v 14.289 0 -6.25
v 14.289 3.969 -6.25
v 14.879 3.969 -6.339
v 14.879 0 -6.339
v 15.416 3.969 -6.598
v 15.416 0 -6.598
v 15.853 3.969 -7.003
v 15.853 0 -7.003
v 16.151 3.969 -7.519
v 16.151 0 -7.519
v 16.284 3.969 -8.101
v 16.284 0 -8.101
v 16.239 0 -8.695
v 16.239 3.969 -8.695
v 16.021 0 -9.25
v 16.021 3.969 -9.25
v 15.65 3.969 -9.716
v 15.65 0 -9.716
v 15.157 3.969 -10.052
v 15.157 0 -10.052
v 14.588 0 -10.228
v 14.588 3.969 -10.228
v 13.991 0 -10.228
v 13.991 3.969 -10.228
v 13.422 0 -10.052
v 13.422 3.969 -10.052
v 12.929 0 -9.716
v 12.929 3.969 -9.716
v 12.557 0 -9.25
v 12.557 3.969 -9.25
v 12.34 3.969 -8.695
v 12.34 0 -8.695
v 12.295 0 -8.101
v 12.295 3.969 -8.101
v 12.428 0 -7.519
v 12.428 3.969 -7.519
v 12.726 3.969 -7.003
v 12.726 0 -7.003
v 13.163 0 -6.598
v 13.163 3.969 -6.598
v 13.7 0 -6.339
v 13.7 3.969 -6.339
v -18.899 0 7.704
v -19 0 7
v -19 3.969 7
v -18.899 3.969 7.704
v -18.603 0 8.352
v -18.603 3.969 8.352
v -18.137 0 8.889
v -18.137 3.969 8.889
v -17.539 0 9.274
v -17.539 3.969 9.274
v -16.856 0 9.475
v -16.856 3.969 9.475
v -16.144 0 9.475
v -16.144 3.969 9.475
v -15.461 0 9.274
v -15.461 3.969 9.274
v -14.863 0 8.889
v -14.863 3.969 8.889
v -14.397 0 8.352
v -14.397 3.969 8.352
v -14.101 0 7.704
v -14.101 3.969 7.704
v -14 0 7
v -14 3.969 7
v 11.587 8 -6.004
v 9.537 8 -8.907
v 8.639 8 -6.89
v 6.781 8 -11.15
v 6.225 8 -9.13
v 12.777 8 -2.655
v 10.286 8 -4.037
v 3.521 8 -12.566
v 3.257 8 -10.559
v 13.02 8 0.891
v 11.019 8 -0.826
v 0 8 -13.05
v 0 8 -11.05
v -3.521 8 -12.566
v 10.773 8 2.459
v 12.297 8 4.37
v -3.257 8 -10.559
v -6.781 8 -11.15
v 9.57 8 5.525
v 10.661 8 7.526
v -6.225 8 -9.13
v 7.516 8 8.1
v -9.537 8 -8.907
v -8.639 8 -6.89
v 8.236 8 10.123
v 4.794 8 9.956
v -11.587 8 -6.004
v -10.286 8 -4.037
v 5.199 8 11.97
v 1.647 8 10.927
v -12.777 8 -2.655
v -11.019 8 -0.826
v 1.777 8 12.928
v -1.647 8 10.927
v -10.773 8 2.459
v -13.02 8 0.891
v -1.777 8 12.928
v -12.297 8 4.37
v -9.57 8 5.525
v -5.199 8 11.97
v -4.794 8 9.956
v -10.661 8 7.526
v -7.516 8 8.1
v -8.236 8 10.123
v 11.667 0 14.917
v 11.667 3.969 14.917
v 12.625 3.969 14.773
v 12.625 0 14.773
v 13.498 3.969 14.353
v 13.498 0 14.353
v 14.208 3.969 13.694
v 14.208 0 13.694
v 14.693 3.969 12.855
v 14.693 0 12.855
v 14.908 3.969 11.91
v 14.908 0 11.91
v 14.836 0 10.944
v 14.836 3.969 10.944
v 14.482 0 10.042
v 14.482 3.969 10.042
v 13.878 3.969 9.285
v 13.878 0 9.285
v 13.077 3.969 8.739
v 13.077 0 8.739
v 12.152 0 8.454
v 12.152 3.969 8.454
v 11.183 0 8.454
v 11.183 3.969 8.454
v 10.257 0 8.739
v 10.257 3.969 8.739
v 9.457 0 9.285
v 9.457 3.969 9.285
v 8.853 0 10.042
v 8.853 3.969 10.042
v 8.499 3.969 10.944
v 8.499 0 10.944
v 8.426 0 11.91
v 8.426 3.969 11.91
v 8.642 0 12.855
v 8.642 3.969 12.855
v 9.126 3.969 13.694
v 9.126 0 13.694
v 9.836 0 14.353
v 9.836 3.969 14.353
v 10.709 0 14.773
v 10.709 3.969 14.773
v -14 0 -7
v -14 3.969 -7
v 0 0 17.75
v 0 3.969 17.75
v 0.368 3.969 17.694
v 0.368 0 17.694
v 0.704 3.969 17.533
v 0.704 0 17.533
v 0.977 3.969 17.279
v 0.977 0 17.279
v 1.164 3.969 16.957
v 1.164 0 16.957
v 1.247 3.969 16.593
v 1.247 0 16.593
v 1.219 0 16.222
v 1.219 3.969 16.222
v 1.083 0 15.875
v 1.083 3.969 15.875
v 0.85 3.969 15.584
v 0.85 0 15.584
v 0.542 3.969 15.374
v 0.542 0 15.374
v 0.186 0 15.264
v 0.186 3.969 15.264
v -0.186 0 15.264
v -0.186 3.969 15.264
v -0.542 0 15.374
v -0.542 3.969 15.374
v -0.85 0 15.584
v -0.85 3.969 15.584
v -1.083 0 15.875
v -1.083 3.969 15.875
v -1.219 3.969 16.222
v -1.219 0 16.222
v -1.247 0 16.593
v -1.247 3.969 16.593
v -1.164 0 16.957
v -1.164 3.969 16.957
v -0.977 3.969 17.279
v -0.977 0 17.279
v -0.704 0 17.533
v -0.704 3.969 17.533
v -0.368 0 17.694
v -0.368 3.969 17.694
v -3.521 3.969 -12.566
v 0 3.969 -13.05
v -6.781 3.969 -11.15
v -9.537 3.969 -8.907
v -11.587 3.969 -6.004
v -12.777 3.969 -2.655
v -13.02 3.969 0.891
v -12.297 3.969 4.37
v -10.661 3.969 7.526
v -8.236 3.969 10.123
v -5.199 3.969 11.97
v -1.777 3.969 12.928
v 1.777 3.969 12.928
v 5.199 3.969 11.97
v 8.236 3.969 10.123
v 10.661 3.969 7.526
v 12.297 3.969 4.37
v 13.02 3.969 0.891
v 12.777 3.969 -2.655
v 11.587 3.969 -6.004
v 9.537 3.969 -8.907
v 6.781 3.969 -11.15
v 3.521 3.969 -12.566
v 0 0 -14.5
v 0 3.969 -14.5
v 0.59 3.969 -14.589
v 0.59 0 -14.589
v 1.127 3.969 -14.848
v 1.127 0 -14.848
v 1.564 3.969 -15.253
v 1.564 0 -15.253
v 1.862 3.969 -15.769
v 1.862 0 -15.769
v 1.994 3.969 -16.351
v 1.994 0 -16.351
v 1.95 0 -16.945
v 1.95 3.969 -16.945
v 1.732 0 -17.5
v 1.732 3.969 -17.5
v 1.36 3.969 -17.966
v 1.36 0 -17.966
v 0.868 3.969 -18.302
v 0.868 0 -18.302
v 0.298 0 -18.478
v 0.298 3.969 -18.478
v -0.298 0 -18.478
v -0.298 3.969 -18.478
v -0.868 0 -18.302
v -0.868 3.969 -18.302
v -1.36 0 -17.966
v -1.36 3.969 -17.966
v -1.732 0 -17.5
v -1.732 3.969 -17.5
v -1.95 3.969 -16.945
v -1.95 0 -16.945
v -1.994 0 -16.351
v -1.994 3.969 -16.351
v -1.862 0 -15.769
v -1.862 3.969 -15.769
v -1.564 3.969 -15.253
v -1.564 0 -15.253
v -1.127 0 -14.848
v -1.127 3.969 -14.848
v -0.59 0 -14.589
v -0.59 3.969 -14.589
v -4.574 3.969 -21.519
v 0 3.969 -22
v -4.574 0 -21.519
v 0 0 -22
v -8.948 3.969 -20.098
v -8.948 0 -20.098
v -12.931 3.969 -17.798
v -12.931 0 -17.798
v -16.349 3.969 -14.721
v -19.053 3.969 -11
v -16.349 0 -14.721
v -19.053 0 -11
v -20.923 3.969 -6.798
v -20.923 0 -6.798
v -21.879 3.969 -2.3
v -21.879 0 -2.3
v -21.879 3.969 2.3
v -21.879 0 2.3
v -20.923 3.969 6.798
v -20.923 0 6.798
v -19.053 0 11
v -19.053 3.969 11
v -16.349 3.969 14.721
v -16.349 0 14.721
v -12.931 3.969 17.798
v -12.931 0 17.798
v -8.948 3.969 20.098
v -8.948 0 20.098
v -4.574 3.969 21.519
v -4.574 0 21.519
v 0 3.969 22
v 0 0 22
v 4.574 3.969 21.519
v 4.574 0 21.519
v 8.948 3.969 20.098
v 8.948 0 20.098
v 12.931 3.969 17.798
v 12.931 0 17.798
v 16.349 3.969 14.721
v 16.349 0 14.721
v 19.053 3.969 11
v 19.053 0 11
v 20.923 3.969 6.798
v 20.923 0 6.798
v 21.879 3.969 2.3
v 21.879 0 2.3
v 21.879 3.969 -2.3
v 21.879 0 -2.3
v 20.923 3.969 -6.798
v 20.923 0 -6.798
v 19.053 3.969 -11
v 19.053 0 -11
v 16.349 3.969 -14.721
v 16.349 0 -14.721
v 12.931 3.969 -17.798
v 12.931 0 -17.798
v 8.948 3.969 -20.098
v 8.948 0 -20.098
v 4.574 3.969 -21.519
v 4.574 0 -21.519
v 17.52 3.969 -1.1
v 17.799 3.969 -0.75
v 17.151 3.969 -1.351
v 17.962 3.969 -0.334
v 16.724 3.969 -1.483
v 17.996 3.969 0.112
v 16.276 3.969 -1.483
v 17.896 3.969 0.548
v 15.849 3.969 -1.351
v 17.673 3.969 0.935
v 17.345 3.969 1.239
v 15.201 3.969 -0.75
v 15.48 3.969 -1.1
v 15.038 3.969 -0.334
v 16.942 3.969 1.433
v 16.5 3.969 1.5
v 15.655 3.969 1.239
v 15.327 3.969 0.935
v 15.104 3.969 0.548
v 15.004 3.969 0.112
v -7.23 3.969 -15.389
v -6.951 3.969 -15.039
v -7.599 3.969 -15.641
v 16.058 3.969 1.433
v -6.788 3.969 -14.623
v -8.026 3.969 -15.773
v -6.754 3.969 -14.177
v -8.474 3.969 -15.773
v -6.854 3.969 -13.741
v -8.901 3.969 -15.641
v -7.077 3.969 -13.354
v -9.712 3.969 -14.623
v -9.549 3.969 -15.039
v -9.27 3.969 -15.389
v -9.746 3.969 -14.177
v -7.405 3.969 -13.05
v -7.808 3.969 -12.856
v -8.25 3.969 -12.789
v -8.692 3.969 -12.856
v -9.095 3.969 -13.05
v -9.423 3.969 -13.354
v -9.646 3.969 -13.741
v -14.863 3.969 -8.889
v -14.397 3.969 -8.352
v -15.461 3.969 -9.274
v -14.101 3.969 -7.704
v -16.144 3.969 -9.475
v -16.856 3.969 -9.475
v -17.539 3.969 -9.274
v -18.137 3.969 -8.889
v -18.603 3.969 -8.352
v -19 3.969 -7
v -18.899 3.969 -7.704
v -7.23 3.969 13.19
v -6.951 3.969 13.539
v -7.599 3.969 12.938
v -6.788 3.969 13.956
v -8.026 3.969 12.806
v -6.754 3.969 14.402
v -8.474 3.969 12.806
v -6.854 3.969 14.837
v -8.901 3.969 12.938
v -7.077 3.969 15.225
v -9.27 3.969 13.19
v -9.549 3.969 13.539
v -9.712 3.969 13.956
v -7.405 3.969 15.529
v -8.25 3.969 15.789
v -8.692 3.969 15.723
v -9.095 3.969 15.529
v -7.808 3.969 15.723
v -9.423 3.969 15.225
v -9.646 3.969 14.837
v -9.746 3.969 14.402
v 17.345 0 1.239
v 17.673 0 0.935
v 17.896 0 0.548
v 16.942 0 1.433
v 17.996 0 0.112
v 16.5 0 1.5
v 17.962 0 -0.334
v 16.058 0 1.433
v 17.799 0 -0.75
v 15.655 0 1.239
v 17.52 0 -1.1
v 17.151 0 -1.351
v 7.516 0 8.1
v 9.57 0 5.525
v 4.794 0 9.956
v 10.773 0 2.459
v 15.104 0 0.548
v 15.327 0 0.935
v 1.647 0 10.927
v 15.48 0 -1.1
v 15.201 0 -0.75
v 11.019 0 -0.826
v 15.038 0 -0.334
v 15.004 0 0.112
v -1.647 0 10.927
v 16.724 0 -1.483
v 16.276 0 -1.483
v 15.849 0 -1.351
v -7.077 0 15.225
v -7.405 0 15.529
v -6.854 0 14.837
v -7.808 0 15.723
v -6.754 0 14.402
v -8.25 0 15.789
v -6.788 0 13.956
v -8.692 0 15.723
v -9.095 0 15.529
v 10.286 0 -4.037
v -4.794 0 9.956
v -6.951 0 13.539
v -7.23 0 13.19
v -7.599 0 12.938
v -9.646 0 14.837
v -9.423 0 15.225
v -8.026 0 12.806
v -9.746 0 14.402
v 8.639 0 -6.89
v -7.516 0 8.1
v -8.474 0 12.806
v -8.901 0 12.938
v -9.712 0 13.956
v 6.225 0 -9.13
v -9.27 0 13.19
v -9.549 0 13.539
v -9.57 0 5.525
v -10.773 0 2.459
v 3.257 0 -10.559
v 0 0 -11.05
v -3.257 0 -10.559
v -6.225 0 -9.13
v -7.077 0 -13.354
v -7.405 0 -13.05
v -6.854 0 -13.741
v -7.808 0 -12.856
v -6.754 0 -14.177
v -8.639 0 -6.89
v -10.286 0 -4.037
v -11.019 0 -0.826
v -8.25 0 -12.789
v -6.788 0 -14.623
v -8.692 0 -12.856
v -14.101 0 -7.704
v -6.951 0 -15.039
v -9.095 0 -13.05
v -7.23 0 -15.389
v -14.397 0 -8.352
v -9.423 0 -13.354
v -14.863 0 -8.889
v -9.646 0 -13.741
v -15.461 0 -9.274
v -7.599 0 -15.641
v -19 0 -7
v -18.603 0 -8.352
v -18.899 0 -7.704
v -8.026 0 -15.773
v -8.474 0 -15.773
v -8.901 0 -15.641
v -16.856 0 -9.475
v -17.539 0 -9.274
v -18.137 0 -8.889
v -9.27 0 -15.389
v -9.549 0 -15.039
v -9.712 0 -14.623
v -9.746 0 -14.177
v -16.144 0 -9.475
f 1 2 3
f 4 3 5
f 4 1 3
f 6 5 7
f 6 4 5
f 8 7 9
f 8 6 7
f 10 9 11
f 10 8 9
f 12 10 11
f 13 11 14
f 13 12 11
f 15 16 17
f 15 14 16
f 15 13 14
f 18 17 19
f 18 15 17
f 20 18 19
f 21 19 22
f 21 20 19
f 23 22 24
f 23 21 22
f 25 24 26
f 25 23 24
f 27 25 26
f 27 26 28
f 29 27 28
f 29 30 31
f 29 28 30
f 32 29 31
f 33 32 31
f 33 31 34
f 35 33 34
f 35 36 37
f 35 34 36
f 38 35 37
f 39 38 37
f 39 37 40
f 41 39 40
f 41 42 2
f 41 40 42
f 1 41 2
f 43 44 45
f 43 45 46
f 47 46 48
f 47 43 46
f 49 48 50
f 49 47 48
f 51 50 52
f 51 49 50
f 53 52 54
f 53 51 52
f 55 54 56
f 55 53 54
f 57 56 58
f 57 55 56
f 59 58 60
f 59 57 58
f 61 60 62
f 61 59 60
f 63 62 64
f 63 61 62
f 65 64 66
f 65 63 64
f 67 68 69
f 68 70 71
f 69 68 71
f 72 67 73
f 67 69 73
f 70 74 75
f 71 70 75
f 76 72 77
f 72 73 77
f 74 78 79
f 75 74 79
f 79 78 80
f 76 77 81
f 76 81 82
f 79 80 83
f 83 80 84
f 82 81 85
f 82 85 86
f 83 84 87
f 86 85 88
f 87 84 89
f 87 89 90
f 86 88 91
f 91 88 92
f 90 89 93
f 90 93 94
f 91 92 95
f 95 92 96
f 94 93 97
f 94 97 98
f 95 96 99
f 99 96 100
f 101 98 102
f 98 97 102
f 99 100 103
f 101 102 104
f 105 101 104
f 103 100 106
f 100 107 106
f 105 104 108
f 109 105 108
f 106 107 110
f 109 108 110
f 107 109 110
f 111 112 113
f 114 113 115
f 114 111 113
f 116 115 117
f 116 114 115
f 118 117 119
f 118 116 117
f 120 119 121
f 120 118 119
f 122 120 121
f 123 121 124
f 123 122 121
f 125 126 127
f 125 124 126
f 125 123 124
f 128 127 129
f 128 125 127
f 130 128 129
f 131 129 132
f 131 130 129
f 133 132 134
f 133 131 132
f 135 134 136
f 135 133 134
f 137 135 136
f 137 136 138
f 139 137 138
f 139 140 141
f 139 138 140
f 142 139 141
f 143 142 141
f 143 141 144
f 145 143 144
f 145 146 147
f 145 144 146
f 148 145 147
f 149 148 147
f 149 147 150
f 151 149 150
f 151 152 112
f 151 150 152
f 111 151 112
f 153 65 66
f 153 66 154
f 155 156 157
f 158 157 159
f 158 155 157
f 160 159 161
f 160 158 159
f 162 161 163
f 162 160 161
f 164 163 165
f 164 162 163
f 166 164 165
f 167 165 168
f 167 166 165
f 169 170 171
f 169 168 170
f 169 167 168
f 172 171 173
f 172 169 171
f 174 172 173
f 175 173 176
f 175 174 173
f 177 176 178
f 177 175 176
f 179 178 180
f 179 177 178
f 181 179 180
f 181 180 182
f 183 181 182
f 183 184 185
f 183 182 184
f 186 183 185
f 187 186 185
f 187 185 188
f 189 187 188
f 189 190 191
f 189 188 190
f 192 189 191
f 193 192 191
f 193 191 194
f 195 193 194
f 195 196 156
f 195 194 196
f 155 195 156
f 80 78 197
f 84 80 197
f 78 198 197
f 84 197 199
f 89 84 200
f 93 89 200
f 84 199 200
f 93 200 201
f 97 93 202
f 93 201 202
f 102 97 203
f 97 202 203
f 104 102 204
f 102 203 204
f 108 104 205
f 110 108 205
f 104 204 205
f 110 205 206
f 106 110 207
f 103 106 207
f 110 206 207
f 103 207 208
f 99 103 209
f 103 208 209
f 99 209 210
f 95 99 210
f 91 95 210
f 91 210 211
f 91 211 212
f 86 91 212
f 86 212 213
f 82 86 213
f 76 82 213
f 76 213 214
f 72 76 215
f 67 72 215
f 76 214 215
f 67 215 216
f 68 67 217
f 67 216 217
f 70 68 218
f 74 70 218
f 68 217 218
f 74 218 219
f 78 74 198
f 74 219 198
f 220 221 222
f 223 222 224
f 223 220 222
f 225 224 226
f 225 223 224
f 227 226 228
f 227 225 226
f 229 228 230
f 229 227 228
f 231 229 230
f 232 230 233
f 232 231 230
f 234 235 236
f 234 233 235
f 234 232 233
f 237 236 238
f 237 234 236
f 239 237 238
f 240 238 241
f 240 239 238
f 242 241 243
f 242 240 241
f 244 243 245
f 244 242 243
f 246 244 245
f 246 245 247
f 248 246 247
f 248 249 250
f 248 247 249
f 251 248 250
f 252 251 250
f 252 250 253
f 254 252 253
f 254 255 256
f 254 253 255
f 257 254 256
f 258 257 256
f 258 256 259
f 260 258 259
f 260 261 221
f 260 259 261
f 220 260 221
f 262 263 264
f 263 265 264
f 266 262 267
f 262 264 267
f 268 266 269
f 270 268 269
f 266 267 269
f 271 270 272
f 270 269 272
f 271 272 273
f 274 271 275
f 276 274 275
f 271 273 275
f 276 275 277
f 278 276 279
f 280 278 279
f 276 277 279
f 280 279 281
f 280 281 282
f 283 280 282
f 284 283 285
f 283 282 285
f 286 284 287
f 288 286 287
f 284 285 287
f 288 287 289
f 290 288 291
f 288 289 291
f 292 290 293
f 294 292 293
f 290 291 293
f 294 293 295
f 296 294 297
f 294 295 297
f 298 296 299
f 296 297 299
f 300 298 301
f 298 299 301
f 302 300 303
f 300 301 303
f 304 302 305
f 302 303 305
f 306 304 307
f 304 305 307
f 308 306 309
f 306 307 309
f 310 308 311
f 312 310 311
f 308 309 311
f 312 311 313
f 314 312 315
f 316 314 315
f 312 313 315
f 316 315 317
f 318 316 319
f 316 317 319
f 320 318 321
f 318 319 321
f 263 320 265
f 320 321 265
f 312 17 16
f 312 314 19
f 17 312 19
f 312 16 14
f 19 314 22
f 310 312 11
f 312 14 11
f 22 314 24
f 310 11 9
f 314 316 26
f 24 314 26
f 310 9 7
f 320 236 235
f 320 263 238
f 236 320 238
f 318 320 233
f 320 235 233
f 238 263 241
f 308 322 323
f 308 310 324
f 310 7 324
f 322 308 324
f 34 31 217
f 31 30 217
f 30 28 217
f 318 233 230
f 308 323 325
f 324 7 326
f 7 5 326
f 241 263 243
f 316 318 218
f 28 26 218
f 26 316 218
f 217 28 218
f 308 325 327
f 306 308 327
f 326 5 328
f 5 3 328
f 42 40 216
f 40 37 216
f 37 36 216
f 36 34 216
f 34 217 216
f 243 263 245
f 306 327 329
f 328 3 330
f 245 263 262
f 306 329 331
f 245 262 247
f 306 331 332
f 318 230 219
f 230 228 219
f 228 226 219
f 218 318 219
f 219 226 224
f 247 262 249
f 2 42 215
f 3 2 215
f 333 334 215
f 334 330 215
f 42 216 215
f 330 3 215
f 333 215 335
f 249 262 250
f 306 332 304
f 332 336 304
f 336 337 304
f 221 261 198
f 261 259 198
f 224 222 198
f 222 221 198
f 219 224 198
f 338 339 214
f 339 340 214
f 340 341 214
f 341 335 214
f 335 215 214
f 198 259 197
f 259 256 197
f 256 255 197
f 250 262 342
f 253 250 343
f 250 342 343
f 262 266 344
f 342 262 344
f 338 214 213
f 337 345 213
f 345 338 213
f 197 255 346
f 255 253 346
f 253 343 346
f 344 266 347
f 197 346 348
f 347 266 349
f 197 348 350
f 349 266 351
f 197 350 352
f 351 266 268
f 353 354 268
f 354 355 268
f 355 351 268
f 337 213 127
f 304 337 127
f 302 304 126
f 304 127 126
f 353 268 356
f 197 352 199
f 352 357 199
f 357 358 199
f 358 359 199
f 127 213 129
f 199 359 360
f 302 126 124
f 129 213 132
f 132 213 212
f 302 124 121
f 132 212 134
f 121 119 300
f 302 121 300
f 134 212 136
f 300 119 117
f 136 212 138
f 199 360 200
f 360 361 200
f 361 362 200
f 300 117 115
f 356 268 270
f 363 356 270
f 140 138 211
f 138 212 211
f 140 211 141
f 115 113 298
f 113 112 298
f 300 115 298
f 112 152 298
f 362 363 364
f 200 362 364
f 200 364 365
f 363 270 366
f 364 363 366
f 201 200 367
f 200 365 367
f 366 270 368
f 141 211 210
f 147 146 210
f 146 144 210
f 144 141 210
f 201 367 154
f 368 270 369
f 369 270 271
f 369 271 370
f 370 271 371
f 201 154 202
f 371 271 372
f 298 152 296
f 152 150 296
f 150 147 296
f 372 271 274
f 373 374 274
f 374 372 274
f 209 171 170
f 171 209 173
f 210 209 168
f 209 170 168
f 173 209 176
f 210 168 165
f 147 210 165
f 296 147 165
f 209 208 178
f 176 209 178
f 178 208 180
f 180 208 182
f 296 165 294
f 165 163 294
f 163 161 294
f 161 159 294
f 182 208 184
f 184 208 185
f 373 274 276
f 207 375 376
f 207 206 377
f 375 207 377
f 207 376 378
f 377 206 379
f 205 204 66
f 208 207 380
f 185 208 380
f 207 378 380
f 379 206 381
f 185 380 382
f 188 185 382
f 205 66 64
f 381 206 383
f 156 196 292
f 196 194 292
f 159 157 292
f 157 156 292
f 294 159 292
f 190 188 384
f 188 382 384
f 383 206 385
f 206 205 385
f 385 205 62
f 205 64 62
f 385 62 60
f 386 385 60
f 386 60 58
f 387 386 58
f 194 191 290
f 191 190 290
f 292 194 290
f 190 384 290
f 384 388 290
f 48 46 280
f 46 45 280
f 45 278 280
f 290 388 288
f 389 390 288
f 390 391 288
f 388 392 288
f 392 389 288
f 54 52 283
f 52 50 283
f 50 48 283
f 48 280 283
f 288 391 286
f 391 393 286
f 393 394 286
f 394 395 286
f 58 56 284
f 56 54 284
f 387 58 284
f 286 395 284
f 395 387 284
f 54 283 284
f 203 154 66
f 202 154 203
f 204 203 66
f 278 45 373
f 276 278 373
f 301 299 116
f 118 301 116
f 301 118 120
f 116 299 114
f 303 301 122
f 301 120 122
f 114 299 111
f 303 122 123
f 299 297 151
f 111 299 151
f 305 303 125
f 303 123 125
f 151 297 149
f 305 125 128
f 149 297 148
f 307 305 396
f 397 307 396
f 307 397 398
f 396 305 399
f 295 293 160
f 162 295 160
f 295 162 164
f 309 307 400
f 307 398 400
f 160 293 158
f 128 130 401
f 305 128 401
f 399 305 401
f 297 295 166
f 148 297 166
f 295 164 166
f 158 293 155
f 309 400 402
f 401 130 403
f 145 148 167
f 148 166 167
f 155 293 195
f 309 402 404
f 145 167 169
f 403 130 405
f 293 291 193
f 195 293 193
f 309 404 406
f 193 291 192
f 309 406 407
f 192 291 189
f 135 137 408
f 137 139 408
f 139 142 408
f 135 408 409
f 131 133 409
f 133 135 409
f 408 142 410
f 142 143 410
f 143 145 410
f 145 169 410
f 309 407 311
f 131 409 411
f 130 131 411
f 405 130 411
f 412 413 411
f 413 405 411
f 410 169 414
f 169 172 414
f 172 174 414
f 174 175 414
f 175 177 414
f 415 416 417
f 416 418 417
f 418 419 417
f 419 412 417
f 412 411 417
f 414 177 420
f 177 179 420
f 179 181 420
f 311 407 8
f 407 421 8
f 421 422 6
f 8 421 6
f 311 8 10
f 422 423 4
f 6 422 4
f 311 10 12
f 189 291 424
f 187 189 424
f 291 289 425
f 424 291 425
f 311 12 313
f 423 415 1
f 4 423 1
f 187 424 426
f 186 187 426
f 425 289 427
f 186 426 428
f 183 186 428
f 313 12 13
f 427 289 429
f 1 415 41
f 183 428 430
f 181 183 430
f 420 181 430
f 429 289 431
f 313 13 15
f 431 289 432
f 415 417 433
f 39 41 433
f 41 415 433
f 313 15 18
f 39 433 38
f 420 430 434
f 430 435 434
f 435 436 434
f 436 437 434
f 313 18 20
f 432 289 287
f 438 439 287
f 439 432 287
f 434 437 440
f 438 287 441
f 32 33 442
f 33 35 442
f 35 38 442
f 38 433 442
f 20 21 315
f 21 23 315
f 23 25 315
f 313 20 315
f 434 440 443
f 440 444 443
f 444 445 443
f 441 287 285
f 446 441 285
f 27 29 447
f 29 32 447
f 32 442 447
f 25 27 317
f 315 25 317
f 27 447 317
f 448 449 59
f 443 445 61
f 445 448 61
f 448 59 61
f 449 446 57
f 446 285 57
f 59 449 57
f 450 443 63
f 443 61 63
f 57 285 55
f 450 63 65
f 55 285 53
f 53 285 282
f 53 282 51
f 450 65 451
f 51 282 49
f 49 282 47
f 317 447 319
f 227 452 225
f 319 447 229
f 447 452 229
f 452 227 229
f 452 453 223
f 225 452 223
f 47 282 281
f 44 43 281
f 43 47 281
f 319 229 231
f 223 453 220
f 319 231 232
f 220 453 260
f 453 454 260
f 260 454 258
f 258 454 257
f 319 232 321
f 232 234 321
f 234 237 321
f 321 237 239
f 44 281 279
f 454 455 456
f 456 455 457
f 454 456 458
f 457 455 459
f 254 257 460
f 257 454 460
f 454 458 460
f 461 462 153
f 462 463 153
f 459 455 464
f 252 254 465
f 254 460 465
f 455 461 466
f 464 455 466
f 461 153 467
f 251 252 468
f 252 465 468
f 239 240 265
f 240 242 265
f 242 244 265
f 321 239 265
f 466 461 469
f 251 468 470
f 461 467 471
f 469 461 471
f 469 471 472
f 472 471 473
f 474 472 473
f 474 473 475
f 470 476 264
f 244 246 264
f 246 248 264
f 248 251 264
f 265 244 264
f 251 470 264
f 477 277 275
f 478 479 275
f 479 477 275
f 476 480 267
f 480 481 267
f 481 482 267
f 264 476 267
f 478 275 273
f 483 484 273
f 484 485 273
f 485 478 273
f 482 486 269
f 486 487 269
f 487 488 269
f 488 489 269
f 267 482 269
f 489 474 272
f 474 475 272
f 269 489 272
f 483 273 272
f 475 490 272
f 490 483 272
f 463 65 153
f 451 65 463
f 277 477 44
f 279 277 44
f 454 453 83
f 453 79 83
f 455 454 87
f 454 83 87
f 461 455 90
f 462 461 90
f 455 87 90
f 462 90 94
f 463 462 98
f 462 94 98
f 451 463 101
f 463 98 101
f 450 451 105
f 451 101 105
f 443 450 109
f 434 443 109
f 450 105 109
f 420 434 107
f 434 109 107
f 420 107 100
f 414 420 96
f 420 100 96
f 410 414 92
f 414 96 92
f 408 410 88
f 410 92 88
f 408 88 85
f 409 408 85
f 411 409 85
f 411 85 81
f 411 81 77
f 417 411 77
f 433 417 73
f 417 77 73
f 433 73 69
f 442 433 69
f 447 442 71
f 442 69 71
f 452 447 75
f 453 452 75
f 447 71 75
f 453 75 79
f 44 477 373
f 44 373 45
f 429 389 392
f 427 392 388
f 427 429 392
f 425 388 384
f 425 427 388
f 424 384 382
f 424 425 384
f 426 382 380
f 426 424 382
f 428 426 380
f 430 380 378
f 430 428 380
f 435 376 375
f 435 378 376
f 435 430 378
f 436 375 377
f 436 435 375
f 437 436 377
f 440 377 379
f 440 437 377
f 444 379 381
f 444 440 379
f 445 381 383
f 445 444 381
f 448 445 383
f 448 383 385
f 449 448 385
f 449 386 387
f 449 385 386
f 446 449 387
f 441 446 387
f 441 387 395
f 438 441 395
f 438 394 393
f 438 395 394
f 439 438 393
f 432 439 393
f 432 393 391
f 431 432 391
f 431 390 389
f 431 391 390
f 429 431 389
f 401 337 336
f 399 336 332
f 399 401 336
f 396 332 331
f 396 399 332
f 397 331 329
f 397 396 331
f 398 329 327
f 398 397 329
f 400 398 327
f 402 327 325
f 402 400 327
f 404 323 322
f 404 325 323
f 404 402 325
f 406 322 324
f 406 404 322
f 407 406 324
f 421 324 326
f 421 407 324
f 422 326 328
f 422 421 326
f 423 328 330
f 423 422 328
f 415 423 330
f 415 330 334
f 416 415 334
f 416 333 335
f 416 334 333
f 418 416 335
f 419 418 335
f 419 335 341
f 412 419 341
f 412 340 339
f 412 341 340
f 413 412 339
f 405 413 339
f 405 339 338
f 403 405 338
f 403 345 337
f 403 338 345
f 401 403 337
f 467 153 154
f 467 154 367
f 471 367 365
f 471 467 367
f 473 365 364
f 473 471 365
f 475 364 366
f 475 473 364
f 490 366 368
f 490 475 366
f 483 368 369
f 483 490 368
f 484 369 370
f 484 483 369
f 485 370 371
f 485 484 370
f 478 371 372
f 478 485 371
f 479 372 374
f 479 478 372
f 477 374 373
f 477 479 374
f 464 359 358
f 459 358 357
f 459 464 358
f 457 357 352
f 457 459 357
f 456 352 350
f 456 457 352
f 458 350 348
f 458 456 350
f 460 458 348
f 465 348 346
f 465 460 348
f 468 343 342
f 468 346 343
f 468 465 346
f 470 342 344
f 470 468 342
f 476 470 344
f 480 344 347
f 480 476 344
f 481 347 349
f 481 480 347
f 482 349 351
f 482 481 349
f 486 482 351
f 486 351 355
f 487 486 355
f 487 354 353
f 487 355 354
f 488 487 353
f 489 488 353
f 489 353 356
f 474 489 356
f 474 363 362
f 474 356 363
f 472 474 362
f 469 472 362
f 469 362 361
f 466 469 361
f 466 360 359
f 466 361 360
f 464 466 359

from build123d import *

# Parameters (mm, degrees)
SKETCH3_R          = 1.5
SKETCH3_R_2        = 3.25
SKETCH3_R_3        = 2
SKETCH3_R_4        = 1.25
CUT_EXTRUDE1_DEPTH = 10


with BuildPart() as part:
    # Sketch1 → Revolve1 (revolve)
    with BuildSketch(Plane.XY, mode=Mode.PRIVATE) as revolve1_sk:
        Polygon((11.05, 0), (11.05, 8), (13.05, 8), (13.05, 3.969255392), (22, 3.969255392), (22, 0), align=None)
    revolve(revolve1_sk.sketch.rotate(Axis((0, 0, 0), (0, 1, 0)), 90), axis=Axis((0, 0, 0), (0, 1, 0)))

    # Sketch3 → Cut-Extrude1 (cut)
    with BuildSketch(Plane(origin=(0, 0, 0), x_dir=(1, 0, 0), z_dir=(0, 1, 0))):
        with Locations(Location((16.5, 0, 0), (0, 0, 270))):
            Circle(SKETCH3_R)
        with Locations(Location((-8.25, -14.289419162, 0), (0, 0, 270))):
            Circle(SKETCH3_R)
        with Locations(Location((-8.25, 14.289419162, 0), (0, 0, 270))):
            Circle(SKETCH3_R)
        with Locations(Location((11.66726189, -11.66726189, 0), (0, 0, 270))):
            Circle(SKETCH3_R_2)
        with Locations(Location((14.289419162, 8.25, 0), (0, 0, 270))):
            Circle(SKETCH3_R_3)
        with Locations(Location((0, 16.5, 0), (0, 0, 270))):
            Circle(SKETCH3_R_3)
        with Locations(Location((0, -16.5, 0), (0, 0, 270))):
            Circle(SKETCH3_R_4)
        with BuildLine():
            Line((-14, -7), (-14, 7))
            ThreePointArc((-14, 7), (-16.5, 9.5), (-19, 7))
            Line((-19, 7), (-19, -7))
            ThreePointArc((-19, -7), (-16.5, -9.5), (-14, -7))
        make_face()
    extrude(amount=CUT_EXTRUDE1_DEPTH, mode=Mode.SUBTRACT)


solid = part.part
